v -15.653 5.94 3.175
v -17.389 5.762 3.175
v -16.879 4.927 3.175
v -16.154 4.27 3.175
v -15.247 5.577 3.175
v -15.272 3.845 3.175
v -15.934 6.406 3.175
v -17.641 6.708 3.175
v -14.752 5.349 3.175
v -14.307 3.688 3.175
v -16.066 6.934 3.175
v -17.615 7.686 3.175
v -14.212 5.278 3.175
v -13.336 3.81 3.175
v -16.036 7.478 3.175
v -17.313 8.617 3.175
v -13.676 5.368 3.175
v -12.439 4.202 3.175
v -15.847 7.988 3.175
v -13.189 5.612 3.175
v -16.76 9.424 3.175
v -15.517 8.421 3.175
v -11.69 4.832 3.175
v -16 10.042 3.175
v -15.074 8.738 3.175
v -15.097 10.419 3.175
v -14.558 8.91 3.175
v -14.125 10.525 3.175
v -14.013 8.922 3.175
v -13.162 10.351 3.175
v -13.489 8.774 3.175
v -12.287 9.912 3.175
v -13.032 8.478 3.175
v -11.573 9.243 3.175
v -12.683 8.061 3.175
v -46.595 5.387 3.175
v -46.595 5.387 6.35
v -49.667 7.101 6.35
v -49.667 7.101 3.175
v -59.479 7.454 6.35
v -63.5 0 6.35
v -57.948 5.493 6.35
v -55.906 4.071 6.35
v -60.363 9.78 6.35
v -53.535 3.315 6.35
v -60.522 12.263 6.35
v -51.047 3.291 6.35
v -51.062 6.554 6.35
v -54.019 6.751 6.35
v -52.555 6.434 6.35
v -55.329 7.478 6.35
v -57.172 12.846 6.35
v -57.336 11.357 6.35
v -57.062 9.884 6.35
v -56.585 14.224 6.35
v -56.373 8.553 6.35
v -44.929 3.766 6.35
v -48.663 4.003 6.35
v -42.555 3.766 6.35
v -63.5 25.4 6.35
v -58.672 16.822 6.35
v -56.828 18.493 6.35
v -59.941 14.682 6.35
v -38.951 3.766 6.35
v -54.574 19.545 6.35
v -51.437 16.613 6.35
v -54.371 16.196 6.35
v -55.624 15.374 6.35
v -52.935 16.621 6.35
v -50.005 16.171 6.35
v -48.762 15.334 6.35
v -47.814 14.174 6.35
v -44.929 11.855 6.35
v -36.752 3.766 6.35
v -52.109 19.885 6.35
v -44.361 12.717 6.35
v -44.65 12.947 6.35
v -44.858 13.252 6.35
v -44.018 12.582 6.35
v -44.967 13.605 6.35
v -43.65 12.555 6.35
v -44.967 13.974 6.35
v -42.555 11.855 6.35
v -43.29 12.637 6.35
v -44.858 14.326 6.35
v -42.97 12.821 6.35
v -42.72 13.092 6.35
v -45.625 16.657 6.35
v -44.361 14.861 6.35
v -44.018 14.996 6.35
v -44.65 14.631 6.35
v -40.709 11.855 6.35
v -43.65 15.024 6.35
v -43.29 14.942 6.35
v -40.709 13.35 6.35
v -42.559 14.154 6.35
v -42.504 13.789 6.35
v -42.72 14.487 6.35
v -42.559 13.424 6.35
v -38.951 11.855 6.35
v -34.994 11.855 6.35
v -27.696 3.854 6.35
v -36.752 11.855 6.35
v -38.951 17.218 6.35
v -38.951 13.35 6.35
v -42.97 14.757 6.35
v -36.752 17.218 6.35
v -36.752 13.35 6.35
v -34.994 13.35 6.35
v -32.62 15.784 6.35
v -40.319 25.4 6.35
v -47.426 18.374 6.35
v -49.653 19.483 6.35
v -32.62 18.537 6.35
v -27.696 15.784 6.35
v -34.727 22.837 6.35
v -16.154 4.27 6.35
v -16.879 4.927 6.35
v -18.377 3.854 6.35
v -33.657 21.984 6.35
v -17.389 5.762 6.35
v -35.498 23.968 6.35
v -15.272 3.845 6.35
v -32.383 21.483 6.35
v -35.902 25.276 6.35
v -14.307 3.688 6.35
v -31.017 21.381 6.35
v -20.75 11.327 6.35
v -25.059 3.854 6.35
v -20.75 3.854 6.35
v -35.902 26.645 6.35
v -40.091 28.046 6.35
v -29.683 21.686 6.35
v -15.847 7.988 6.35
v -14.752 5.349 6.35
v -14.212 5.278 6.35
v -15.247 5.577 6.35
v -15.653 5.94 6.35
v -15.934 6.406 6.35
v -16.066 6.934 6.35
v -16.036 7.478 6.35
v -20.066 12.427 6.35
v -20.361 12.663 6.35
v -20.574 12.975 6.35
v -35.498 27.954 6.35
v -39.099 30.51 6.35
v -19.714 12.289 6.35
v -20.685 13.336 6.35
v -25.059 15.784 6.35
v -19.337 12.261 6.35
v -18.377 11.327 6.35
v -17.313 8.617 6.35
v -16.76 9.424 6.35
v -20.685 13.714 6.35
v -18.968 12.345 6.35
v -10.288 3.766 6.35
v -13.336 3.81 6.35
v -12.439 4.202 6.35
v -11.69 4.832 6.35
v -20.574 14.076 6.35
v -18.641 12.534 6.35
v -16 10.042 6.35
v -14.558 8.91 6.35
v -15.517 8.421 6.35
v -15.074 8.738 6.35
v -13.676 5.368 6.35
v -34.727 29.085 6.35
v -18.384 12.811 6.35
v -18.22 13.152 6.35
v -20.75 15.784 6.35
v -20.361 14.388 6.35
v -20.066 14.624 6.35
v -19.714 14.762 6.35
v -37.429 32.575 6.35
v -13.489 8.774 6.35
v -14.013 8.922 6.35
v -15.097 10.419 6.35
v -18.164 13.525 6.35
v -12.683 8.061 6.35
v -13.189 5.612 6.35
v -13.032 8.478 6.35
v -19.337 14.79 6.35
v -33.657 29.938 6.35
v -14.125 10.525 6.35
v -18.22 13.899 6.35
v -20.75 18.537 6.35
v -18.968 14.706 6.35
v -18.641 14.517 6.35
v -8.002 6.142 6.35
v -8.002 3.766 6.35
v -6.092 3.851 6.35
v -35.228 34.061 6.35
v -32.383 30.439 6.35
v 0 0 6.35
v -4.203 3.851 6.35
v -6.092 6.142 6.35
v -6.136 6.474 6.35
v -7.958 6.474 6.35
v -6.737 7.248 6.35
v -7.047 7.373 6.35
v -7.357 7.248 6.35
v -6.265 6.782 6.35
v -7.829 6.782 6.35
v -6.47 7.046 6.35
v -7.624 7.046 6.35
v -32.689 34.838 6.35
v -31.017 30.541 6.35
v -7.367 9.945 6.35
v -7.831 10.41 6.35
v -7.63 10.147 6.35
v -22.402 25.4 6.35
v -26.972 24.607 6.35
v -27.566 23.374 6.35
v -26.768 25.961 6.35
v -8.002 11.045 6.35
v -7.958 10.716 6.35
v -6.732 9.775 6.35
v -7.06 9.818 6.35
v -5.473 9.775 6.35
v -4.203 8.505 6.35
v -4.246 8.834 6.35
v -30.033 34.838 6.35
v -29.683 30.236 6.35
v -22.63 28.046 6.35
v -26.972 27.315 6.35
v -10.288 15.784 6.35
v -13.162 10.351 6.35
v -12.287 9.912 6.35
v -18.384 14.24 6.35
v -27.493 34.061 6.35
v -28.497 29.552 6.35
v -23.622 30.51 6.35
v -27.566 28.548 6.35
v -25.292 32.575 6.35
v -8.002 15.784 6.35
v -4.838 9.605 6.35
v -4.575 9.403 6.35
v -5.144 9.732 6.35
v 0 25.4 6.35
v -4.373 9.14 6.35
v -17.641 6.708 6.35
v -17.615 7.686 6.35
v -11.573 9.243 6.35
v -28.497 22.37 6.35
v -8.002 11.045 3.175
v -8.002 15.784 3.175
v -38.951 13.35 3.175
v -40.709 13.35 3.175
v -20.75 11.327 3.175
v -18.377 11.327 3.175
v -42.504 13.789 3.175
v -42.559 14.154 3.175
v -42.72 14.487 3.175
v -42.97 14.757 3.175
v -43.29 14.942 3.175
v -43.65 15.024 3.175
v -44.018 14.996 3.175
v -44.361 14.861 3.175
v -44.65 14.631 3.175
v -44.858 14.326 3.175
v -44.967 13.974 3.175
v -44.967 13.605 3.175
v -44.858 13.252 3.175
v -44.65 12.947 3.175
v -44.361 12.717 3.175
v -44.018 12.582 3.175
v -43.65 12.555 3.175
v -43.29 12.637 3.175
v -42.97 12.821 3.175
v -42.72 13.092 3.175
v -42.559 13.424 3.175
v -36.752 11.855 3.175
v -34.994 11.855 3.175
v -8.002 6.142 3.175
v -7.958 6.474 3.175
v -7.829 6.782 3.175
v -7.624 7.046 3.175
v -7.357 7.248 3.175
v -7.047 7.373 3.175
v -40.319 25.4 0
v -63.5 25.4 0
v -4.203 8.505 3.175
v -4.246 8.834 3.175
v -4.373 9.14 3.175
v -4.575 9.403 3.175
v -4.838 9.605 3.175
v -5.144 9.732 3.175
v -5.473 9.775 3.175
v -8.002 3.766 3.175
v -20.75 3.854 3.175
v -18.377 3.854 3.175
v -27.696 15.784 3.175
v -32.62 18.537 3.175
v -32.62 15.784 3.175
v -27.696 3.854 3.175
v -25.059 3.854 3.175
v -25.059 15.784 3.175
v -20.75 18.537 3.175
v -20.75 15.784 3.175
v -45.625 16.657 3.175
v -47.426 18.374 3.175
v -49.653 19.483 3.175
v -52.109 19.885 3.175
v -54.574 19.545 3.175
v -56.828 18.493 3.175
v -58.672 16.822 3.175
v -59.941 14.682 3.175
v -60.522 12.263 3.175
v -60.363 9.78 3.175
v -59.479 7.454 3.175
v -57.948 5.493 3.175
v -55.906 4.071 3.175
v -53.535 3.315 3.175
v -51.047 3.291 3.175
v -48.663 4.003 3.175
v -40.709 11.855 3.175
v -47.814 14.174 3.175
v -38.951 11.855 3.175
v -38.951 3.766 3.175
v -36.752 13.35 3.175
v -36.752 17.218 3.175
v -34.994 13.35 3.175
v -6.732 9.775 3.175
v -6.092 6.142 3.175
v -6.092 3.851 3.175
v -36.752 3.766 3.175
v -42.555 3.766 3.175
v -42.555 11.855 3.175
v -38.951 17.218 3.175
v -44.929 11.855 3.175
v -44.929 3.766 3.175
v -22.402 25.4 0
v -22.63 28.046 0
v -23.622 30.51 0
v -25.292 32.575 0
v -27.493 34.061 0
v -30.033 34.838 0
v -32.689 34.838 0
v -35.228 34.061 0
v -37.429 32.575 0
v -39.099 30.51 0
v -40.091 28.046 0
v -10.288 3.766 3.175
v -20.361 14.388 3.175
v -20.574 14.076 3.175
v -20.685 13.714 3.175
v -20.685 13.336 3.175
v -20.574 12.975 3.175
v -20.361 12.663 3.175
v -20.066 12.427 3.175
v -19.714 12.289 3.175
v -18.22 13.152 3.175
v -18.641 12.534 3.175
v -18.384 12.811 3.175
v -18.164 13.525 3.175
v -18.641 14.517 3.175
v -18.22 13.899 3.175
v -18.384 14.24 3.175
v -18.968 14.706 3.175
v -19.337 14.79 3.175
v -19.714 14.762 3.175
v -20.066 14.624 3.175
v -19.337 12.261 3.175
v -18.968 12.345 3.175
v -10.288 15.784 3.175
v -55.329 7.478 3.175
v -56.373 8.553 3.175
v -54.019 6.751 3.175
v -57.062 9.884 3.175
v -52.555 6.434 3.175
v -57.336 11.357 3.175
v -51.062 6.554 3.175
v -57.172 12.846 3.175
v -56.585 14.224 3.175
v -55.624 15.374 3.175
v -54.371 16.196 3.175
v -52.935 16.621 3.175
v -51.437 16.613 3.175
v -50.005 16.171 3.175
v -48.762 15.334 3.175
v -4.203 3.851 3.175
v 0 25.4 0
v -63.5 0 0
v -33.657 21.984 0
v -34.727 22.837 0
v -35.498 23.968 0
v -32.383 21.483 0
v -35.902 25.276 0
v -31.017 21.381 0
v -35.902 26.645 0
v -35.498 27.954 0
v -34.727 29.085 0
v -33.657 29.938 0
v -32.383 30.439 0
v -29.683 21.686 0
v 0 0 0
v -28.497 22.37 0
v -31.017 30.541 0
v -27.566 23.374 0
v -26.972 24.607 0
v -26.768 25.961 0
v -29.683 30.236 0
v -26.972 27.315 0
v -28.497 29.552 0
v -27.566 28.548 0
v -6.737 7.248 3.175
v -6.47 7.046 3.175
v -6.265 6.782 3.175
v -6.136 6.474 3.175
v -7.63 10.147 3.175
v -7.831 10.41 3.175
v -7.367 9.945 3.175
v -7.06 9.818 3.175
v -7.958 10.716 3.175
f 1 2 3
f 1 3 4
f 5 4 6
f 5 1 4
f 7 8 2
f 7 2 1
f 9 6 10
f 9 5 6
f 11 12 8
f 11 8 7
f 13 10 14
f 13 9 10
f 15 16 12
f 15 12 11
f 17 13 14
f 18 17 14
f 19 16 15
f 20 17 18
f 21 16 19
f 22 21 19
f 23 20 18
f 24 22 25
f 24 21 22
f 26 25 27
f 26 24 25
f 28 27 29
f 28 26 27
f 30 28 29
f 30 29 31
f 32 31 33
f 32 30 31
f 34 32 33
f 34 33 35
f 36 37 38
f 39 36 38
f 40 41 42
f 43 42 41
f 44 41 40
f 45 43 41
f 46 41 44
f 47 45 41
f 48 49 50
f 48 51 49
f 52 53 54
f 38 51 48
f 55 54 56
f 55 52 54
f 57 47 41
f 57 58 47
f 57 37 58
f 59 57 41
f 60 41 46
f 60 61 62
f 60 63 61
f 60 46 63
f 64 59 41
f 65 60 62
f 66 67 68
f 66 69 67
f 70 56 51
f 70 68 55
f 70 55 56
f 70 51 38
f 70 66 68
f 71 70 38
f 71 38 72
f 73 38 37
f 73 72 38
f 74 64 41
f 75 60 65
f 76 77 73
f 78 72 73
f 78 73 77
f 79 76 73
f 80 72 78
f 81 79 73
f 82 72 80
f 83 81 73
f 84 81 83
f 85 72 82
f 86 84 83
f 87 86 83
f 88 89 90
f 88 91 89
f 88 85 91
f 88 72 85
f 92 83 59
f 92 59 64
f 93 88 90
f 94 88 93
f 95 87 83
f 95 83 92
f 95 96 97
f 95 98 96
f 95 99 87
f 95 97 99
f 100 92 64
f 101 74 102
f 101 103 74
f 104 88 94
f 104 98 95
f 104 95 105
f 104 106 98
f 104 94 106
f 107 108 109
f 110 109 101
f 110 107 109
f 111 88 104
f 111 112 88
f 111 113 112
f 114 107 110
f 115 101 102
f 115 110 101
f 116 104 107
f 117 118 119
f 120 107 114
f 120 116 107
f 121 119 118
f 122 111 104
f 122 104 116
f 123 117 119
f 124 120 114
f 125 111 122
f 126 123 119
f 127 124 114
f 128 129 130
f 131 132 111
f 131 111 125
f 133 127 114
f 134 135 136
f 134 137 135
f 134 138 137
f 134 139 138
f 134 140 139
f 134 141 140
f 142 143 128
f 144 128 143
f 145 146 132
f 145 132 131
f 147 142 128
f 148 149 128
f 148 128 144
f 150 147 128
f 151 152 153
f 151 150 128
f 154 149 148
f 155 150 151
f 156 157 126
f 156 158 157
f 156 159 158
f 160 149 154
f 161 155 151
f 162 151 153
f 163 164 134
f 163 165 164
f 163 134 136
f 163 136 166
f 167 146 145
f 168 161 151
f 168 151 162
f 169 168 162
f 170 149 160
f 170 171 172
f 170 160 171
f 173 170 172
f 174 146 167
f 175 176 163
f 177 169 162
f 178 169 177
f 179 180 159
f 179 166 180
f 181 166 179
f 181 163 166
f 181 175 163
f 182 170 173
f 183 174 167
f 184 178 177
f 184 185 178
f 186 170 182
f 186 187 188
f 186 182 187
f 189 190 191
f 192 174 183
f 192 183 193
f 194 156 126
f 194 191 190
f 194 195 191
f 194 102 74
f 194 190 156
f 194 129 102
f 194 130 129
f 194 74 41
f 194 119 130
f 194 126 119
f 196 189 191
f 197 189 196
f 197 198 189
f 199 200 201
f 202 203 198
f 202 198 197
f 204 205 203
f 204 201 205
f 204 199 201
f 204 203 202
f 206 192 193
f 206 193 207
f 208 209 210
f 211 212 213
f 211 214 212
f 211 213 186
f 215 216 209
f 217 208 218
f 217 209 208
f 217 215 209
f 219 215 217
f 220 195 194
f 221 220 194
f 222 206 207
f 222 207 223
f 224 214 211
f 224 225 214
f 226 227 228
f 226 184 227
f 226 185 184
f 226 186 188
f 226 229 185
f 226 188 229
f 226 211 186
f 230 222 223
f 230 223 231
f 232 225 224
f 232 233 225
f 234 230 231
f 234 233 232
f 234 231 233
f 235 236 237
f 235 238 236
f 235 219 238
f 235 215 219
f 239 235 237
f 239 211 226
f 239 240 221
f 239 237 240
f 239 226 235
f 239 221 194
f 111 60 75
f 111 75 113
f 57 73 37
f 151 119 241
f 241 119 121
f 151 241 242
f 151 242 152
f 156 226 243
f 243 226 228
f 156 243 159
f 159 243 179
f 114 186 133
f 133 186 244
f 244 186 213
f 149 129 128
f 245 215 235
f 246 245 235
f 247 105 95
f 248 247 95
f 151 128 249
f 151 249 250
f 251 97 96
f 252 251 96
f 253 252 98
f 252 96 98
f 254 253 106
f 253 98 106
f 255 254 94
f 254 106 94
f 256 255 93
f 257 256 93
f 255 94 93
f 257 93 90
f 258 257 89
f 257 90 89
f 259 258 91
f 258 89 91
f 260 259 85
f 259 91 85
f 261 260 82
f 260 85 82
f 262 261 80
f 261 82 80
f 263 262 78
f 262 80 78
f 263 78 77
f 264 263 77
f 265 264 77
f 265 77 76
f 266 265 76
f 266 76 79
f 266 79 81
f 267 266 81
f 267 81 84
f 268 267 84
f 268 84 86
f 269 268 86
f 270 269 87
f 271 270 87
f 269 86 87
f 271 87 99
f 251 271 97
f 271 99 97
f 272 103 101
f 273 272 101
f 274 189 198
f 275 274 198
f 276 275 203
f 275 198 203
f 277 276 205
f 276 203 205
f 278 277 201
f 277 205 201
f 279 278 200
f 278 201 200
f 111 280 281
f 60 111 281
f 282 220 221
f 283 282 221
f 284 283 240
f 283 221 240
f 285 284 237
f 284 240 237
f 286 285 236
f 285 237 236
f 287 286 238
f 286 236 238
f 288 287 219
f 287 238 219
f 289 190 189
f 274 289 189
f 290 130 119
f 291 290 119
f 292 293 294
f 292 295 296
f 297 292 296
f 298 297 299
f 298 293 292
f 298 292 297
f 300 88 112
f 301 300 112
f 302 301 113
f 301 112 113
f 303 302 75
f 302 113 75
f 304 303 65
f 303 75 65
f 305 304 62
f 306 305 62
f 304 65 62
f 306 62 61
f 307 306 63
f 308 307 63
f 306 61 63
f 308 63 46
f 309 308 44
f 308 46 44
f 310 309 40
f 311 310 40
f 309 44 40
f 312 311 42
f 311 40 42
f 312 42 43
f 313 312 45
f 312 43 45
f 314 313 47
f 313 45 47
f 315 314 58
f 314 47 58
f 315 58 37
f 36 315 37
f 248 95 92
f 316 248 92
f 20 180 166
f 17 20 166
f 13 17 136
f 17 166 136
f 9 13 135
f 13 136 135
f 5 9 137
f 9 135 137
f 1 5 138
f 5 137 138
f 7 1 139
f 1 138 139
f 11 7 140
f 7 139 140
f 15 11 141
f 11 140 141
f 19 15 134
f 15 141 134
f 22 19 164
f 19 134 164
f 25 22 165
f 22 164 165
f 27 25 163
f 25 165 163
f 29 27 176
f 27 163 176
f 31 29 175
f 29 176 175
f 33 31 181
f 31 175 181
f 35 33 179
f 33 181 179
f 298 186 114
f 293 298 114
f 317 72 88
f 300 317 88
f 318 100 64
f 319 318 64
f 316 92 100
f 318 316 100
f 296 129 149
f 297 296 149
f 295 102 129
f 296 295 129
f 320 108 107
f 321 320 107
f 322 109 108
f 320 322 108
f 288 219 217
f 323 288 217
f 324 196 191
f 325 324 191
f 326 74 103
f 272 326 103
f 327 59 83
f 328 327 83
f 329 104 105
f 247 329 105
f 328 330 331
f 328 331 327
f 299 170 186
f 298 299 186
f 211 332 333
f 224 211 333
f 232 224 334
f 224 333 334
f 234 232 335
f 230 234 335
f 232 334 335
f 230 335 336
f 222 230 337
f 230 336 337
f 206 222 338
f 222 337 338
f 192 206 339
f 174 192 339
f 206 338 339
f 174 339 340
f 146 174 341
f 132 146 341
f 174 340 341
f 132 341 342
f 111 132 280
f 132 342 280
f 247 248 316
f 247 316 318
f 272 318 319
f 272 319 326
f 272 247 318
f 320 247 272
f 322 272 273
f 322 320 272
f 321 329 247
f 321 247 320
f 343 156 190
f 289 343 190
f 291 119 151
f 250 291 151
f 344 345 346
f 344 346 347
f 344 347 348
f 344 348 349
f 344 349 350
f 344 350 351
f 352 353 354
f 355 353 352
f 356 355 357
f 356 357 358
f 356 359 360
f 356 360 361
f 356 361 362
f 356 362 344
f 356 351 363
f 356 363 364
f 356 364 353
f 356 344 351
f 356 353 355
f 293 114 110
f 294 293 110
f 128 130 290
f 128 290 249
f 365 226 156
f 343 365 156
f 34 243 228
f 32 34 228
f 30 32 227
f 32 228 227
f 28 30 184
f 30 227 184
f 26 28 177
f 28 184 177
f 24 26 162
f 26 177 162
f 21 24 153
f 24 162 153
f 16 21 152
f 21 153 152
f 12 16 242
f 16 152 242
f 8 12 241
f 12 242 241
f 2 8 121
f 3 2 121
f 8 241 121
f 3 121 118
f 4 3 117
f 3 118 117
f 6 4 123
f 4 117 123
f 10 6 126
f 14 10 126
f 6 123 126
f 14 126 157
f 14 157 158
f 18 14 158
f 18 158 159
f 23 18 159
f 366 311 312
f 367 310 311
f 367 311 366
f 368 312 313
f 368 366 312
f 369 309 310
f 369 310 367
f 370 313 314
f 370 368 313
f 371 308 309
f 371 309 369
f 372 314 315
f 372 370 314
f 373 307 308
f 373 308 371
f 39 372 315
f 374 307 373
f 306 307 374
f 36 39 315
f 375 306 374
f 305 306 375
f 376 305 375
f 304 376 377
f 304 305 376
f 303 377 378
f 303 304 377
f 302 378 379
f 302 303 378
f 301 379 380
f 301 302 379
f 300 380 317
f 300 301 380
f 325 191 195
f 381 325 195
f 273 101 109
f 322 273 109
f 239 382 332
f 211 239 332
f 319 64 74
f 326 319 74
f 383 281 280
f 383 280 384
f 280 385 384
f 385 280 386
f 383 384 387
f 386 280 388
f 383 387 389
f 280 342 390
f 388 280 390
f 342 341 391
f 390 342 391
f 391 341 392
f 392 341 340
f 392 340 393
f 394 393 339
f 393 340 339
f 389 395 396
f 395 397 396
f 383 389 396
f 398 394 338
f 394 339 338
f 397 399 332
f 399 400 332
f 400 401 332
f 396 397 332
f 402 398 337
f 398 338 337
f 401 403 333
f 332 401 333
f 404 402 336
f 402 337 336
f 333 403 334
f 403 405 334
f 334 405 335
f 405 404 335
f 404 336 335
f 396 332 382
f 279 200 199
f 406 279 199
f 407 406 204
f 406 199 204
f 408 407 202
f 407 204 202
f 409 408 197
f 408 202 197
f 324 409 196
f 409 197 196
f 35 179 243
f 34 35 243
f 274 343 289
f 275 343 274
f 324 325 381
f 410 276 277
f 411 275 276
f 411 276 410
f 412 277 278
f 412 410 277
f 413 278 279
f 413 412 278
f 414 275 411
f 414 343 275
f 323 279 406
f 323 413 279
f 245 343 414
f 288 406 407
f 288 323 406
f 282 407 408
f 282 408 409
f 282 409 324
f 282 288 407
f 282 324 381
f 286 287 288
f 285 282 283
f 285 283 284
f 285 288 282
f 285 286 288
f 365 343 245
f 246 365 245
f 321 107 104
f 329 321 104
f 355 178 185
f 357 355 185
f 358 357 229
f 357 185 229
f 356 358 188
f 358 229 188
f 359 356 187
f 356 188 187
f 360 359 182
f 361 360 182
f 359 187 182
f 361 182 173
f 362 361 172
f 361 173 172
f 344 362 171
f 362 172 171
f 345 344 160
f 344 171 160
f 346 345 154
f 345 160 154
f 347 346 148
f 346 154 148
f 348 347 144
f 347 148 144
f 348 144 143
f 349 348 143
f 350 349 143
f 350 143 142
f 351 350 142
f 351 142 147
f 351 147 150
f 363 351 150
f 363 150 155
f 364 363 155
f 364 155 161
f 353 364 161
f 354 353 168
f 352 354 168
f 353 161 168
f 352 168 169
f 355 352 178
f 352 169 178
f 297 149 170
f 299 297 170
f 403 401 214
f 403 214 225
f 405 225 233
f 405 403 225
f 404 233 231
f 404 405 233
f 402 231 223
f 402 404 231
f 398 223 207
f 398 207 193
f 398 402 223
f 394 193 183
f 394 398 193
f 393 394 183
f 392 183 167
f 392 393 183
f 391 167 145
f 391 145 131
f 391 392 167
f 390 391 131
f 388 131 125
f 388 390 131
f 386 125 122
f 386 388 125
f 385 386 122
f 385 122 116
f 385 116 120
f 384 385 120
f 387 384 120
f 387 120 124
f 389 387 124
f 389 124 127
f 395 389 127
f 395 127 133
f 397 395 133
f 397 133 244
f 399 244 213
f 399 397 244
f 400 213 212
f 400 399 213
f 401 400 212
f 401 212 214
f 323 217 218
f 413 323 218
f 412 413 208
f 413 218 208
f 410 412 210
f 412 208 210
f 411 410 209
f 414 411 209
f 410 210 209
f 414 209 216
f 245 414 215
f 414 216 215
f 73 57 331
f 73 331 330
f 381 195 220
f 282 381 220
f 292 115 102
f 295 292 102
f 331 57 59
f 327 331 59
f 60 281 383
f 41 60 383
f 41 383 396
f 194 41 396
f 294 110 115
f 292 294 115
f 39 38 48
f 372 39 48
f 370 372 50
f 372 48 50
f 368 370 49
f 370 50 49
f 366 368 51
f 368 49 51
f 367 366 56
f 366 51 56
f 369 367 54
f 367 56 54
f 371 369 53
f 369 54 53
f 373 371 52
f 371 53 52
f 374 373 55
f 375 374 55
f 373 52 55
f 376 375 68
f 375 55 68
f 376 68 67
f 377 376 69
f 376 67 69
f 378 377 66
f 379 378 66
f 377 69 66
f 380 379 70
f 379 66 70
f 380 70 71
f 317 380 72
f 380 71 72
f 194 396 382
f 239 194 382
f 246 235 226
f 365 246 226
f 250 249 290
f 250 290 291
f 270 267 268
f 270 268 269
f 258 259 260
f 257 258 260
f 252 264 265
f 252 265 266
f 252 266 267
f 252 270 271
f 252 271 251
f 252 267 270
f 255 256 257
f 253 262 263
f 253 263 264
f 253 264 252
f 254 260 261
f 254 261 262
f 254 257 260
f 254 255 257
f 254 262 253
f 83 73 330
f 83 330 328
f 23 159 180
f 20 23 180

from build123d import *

# Parameters (mm, degrees)
F0_R     = 4.5926712991
F1_DEPTH = 6.35
F2_W     = 2.3739238567
F2_H     = 8.0889270103
F2_W_2   = 2.3739274609
F2_H_2   = 7.4734649694
F2_R     = 1.2680453983
F2_R_2   = 1.2379691671
F3_DEPTH = 3.175


# Not quite as in the source:
# - a length typed as a fraction of an inch, garbled in the dataset ("3 / 203.2 mm" for 3/8 in), is restored


with BuildPart() as f1:
    # F0 (on Top) → F1 (new body)
    with BuildSketch(Plane.XY):
        with BuildLine():
            Line((-63.5, 0), (0, 0))
            Line((0, 0), (0, 25.4))
            Line((0, 25.4), (-22.4021356553, 25.4))
            ThreePointArc((-22.4021356553, 25.4), (-31.3605917618, 34.9369900473), (-40.3190478683, 25.4))
            Line((-40.3190478683, 25.4), (-63.5, 25.4))
            Line((-63.5, 25.4), (-63.5, 0))
        make_face()
        with Locations((-31.3605917618, 25.960986396)):
            Circle(F0_R, mode=Mode.SUBTRACT)
    extrude(amount=F1_DEPTH)

    # F2 (on face) → F3 (cut)
    with BuildSketch(Plane.XY.offset(6.35)):
        with BuildLine():
            Line((-47.8143577063, 14.1739739048), (-45.6251816468, 16.6567004661))
            ThreePointArc((-45.6251816468, 16.6567004661), (-60.5221954701, 12.262678636), (-46.5953443626, 5.3872683266))
            Line((-46.5953443626, 5.3872683266), (-49.6666999843, 7.1012593313))
            ThreePointArc((-49.6666999843, 7.1012593313), (-57.1721052058, 12.8458444774), (-47.8143577063, 14.1739739048))
        make_face()
        Polygon((-20.7504647221, 18.5370575163), (-32.6200858075, 18.5370575163), (-32.6200858075, 15.7841322933), (-27.6963894798, 15.7841322933), (-27.6963894798, 3.8538966697), (-25.0586963057, 3.8538966697), (-25.0586963057, 15.7841322933), (-20.7504647221, 15.7841322933), align=None)
        with BuildLine():
            Line((-8.0016118277, 15.7841322933), (-10.2876118277, 15.7841322933))
            Line((-10.2876118277, 15.7841322933), (-10.2876118277, 3.7659732636))
            Line((-10.2876118277, 3.7659732636), (-8.0016118277, 3.7659732636))
            Line((-8.0016118277, 3.7659732636), (-8.0016118277, 6.1422445658))
            ThreePointArc((-8.0016118277, 6.1422445658), (-7.7348762924, 6.9209360412), (-7.0467135382, 7.3725335205))
            ThreePointArc((-7.0467135382, 7.3725335205), (-6.358550784, 6.9209360412), (-6.0918152487, 6.1422445658))
            Line((-6.0918152487, 6.1422445658), (-6.0918152487, 3.8510074993))
            Line((-6.0918152487, 3.8510074993), (-4.2027005772, 3.8510074993))
            Line((-4.2027005772, 3.8510074993), (-4.2027005772, 8.5050527784))
            ThreePointArc((-4.2027005772, 8.5050527784), (-4.5746749651, 9.4030783905), (-5.4727005772, 9.7750527784))
            Line((-5.4727005772, 9.7750527784), (-6.7316118277, 9.7750527784))
            ThreePointArc((-6.7316118277, 9.7750527784), (-7.6296374398, 10.1470271663), (-8.0016118277, 11.0450527784))
            Line((-8.0016118277, 11.0450527784), (-8.0016118277, 15.7841322933))
        make_face()
        with BuildLine():
            ThreePointArc((-6.7316118277, 7.4122445658), (-6.8904089113, 7.4022776948), (-7.0467135382, 7.3725335205))
            ThreePointArc((-7.0467135382, 7.3725335205), (-7.203018165, 7.4022776948), (-7.3618152487, 7.4122445658))
            Line((-7.3618152487, 7.4122445658), (-6.7316118277, 7.4122445658))
        make_face(mode=Mode.SUBTRACT)
        Polygon((-36.7524705789, 17.2182109293), (-38.9505494254, 17.2182109293), (-38.9505494254, 13.3495927722), (-40.7090139442, 13.3495927722), (-40.7090139442, 11.8549002739), (-38.9505494254, 11.8549002739), (-38.9505494254, 3.7659732636), (-36.7524705789, 3.7659732636), (-36.7524705789, 11.8549002739), (-34.9940096642, 11.8549002739), (-34.9940096642, 13.3495927722), (-36.7524705789, 13.3495927722), align=None)
        with BuildLine():
            Line((-12.6827618144, 8.0606505512), (-11.5731045271, 9.2428652738))
            ThreePointArc((-11.5731045271, 9.2428652738), (-17.6629146287, 7.19801004), (-11.6904523614, 4.8322301544))
            Line((-11.6904523614, 4.8322301544), (-13.1890844097, 5.6123530456))
            ThreePointArc((-13.1890844097, 5.6123530456), (-16.0358025283, 7.4775754374), (-12.6827618144, 8.0606505512))
        make_face()
        with Locations((-43.7423610944, 7.8104367687)):
            Rectangle(F2_W, F2_H)
        with Locations((-19.5635009916, 7.5906291544)):
            Rectangle(F2_W_2, F2_H_2)
        with Locations((-19.4316163329, 13.5254395845)):
            Circle(F2_R)
        with Locations((-43.7423610944, 13.7892089019)):
            Circle(F2_R_2)
        with BuildLine():
            ThreePointArc((-7.3618152487, 7.4122445658), (-7.203018165, 7.4022776948), (-7.0467135382, 7.3725335205))
            ThreePointArc((-7.0467135382, 7.3725335205), (-6.8904089113, 7.4022776948), (-6.7316118277, 7.4122445658))
            Line((-6.7316118277, 7.4122445658), (-7.3618152487, 7.4122445658))
        make_face()
    extrude(amount=-F3_DEPTH, mode=Mode.SUBTRACT)


solid = f1.part
